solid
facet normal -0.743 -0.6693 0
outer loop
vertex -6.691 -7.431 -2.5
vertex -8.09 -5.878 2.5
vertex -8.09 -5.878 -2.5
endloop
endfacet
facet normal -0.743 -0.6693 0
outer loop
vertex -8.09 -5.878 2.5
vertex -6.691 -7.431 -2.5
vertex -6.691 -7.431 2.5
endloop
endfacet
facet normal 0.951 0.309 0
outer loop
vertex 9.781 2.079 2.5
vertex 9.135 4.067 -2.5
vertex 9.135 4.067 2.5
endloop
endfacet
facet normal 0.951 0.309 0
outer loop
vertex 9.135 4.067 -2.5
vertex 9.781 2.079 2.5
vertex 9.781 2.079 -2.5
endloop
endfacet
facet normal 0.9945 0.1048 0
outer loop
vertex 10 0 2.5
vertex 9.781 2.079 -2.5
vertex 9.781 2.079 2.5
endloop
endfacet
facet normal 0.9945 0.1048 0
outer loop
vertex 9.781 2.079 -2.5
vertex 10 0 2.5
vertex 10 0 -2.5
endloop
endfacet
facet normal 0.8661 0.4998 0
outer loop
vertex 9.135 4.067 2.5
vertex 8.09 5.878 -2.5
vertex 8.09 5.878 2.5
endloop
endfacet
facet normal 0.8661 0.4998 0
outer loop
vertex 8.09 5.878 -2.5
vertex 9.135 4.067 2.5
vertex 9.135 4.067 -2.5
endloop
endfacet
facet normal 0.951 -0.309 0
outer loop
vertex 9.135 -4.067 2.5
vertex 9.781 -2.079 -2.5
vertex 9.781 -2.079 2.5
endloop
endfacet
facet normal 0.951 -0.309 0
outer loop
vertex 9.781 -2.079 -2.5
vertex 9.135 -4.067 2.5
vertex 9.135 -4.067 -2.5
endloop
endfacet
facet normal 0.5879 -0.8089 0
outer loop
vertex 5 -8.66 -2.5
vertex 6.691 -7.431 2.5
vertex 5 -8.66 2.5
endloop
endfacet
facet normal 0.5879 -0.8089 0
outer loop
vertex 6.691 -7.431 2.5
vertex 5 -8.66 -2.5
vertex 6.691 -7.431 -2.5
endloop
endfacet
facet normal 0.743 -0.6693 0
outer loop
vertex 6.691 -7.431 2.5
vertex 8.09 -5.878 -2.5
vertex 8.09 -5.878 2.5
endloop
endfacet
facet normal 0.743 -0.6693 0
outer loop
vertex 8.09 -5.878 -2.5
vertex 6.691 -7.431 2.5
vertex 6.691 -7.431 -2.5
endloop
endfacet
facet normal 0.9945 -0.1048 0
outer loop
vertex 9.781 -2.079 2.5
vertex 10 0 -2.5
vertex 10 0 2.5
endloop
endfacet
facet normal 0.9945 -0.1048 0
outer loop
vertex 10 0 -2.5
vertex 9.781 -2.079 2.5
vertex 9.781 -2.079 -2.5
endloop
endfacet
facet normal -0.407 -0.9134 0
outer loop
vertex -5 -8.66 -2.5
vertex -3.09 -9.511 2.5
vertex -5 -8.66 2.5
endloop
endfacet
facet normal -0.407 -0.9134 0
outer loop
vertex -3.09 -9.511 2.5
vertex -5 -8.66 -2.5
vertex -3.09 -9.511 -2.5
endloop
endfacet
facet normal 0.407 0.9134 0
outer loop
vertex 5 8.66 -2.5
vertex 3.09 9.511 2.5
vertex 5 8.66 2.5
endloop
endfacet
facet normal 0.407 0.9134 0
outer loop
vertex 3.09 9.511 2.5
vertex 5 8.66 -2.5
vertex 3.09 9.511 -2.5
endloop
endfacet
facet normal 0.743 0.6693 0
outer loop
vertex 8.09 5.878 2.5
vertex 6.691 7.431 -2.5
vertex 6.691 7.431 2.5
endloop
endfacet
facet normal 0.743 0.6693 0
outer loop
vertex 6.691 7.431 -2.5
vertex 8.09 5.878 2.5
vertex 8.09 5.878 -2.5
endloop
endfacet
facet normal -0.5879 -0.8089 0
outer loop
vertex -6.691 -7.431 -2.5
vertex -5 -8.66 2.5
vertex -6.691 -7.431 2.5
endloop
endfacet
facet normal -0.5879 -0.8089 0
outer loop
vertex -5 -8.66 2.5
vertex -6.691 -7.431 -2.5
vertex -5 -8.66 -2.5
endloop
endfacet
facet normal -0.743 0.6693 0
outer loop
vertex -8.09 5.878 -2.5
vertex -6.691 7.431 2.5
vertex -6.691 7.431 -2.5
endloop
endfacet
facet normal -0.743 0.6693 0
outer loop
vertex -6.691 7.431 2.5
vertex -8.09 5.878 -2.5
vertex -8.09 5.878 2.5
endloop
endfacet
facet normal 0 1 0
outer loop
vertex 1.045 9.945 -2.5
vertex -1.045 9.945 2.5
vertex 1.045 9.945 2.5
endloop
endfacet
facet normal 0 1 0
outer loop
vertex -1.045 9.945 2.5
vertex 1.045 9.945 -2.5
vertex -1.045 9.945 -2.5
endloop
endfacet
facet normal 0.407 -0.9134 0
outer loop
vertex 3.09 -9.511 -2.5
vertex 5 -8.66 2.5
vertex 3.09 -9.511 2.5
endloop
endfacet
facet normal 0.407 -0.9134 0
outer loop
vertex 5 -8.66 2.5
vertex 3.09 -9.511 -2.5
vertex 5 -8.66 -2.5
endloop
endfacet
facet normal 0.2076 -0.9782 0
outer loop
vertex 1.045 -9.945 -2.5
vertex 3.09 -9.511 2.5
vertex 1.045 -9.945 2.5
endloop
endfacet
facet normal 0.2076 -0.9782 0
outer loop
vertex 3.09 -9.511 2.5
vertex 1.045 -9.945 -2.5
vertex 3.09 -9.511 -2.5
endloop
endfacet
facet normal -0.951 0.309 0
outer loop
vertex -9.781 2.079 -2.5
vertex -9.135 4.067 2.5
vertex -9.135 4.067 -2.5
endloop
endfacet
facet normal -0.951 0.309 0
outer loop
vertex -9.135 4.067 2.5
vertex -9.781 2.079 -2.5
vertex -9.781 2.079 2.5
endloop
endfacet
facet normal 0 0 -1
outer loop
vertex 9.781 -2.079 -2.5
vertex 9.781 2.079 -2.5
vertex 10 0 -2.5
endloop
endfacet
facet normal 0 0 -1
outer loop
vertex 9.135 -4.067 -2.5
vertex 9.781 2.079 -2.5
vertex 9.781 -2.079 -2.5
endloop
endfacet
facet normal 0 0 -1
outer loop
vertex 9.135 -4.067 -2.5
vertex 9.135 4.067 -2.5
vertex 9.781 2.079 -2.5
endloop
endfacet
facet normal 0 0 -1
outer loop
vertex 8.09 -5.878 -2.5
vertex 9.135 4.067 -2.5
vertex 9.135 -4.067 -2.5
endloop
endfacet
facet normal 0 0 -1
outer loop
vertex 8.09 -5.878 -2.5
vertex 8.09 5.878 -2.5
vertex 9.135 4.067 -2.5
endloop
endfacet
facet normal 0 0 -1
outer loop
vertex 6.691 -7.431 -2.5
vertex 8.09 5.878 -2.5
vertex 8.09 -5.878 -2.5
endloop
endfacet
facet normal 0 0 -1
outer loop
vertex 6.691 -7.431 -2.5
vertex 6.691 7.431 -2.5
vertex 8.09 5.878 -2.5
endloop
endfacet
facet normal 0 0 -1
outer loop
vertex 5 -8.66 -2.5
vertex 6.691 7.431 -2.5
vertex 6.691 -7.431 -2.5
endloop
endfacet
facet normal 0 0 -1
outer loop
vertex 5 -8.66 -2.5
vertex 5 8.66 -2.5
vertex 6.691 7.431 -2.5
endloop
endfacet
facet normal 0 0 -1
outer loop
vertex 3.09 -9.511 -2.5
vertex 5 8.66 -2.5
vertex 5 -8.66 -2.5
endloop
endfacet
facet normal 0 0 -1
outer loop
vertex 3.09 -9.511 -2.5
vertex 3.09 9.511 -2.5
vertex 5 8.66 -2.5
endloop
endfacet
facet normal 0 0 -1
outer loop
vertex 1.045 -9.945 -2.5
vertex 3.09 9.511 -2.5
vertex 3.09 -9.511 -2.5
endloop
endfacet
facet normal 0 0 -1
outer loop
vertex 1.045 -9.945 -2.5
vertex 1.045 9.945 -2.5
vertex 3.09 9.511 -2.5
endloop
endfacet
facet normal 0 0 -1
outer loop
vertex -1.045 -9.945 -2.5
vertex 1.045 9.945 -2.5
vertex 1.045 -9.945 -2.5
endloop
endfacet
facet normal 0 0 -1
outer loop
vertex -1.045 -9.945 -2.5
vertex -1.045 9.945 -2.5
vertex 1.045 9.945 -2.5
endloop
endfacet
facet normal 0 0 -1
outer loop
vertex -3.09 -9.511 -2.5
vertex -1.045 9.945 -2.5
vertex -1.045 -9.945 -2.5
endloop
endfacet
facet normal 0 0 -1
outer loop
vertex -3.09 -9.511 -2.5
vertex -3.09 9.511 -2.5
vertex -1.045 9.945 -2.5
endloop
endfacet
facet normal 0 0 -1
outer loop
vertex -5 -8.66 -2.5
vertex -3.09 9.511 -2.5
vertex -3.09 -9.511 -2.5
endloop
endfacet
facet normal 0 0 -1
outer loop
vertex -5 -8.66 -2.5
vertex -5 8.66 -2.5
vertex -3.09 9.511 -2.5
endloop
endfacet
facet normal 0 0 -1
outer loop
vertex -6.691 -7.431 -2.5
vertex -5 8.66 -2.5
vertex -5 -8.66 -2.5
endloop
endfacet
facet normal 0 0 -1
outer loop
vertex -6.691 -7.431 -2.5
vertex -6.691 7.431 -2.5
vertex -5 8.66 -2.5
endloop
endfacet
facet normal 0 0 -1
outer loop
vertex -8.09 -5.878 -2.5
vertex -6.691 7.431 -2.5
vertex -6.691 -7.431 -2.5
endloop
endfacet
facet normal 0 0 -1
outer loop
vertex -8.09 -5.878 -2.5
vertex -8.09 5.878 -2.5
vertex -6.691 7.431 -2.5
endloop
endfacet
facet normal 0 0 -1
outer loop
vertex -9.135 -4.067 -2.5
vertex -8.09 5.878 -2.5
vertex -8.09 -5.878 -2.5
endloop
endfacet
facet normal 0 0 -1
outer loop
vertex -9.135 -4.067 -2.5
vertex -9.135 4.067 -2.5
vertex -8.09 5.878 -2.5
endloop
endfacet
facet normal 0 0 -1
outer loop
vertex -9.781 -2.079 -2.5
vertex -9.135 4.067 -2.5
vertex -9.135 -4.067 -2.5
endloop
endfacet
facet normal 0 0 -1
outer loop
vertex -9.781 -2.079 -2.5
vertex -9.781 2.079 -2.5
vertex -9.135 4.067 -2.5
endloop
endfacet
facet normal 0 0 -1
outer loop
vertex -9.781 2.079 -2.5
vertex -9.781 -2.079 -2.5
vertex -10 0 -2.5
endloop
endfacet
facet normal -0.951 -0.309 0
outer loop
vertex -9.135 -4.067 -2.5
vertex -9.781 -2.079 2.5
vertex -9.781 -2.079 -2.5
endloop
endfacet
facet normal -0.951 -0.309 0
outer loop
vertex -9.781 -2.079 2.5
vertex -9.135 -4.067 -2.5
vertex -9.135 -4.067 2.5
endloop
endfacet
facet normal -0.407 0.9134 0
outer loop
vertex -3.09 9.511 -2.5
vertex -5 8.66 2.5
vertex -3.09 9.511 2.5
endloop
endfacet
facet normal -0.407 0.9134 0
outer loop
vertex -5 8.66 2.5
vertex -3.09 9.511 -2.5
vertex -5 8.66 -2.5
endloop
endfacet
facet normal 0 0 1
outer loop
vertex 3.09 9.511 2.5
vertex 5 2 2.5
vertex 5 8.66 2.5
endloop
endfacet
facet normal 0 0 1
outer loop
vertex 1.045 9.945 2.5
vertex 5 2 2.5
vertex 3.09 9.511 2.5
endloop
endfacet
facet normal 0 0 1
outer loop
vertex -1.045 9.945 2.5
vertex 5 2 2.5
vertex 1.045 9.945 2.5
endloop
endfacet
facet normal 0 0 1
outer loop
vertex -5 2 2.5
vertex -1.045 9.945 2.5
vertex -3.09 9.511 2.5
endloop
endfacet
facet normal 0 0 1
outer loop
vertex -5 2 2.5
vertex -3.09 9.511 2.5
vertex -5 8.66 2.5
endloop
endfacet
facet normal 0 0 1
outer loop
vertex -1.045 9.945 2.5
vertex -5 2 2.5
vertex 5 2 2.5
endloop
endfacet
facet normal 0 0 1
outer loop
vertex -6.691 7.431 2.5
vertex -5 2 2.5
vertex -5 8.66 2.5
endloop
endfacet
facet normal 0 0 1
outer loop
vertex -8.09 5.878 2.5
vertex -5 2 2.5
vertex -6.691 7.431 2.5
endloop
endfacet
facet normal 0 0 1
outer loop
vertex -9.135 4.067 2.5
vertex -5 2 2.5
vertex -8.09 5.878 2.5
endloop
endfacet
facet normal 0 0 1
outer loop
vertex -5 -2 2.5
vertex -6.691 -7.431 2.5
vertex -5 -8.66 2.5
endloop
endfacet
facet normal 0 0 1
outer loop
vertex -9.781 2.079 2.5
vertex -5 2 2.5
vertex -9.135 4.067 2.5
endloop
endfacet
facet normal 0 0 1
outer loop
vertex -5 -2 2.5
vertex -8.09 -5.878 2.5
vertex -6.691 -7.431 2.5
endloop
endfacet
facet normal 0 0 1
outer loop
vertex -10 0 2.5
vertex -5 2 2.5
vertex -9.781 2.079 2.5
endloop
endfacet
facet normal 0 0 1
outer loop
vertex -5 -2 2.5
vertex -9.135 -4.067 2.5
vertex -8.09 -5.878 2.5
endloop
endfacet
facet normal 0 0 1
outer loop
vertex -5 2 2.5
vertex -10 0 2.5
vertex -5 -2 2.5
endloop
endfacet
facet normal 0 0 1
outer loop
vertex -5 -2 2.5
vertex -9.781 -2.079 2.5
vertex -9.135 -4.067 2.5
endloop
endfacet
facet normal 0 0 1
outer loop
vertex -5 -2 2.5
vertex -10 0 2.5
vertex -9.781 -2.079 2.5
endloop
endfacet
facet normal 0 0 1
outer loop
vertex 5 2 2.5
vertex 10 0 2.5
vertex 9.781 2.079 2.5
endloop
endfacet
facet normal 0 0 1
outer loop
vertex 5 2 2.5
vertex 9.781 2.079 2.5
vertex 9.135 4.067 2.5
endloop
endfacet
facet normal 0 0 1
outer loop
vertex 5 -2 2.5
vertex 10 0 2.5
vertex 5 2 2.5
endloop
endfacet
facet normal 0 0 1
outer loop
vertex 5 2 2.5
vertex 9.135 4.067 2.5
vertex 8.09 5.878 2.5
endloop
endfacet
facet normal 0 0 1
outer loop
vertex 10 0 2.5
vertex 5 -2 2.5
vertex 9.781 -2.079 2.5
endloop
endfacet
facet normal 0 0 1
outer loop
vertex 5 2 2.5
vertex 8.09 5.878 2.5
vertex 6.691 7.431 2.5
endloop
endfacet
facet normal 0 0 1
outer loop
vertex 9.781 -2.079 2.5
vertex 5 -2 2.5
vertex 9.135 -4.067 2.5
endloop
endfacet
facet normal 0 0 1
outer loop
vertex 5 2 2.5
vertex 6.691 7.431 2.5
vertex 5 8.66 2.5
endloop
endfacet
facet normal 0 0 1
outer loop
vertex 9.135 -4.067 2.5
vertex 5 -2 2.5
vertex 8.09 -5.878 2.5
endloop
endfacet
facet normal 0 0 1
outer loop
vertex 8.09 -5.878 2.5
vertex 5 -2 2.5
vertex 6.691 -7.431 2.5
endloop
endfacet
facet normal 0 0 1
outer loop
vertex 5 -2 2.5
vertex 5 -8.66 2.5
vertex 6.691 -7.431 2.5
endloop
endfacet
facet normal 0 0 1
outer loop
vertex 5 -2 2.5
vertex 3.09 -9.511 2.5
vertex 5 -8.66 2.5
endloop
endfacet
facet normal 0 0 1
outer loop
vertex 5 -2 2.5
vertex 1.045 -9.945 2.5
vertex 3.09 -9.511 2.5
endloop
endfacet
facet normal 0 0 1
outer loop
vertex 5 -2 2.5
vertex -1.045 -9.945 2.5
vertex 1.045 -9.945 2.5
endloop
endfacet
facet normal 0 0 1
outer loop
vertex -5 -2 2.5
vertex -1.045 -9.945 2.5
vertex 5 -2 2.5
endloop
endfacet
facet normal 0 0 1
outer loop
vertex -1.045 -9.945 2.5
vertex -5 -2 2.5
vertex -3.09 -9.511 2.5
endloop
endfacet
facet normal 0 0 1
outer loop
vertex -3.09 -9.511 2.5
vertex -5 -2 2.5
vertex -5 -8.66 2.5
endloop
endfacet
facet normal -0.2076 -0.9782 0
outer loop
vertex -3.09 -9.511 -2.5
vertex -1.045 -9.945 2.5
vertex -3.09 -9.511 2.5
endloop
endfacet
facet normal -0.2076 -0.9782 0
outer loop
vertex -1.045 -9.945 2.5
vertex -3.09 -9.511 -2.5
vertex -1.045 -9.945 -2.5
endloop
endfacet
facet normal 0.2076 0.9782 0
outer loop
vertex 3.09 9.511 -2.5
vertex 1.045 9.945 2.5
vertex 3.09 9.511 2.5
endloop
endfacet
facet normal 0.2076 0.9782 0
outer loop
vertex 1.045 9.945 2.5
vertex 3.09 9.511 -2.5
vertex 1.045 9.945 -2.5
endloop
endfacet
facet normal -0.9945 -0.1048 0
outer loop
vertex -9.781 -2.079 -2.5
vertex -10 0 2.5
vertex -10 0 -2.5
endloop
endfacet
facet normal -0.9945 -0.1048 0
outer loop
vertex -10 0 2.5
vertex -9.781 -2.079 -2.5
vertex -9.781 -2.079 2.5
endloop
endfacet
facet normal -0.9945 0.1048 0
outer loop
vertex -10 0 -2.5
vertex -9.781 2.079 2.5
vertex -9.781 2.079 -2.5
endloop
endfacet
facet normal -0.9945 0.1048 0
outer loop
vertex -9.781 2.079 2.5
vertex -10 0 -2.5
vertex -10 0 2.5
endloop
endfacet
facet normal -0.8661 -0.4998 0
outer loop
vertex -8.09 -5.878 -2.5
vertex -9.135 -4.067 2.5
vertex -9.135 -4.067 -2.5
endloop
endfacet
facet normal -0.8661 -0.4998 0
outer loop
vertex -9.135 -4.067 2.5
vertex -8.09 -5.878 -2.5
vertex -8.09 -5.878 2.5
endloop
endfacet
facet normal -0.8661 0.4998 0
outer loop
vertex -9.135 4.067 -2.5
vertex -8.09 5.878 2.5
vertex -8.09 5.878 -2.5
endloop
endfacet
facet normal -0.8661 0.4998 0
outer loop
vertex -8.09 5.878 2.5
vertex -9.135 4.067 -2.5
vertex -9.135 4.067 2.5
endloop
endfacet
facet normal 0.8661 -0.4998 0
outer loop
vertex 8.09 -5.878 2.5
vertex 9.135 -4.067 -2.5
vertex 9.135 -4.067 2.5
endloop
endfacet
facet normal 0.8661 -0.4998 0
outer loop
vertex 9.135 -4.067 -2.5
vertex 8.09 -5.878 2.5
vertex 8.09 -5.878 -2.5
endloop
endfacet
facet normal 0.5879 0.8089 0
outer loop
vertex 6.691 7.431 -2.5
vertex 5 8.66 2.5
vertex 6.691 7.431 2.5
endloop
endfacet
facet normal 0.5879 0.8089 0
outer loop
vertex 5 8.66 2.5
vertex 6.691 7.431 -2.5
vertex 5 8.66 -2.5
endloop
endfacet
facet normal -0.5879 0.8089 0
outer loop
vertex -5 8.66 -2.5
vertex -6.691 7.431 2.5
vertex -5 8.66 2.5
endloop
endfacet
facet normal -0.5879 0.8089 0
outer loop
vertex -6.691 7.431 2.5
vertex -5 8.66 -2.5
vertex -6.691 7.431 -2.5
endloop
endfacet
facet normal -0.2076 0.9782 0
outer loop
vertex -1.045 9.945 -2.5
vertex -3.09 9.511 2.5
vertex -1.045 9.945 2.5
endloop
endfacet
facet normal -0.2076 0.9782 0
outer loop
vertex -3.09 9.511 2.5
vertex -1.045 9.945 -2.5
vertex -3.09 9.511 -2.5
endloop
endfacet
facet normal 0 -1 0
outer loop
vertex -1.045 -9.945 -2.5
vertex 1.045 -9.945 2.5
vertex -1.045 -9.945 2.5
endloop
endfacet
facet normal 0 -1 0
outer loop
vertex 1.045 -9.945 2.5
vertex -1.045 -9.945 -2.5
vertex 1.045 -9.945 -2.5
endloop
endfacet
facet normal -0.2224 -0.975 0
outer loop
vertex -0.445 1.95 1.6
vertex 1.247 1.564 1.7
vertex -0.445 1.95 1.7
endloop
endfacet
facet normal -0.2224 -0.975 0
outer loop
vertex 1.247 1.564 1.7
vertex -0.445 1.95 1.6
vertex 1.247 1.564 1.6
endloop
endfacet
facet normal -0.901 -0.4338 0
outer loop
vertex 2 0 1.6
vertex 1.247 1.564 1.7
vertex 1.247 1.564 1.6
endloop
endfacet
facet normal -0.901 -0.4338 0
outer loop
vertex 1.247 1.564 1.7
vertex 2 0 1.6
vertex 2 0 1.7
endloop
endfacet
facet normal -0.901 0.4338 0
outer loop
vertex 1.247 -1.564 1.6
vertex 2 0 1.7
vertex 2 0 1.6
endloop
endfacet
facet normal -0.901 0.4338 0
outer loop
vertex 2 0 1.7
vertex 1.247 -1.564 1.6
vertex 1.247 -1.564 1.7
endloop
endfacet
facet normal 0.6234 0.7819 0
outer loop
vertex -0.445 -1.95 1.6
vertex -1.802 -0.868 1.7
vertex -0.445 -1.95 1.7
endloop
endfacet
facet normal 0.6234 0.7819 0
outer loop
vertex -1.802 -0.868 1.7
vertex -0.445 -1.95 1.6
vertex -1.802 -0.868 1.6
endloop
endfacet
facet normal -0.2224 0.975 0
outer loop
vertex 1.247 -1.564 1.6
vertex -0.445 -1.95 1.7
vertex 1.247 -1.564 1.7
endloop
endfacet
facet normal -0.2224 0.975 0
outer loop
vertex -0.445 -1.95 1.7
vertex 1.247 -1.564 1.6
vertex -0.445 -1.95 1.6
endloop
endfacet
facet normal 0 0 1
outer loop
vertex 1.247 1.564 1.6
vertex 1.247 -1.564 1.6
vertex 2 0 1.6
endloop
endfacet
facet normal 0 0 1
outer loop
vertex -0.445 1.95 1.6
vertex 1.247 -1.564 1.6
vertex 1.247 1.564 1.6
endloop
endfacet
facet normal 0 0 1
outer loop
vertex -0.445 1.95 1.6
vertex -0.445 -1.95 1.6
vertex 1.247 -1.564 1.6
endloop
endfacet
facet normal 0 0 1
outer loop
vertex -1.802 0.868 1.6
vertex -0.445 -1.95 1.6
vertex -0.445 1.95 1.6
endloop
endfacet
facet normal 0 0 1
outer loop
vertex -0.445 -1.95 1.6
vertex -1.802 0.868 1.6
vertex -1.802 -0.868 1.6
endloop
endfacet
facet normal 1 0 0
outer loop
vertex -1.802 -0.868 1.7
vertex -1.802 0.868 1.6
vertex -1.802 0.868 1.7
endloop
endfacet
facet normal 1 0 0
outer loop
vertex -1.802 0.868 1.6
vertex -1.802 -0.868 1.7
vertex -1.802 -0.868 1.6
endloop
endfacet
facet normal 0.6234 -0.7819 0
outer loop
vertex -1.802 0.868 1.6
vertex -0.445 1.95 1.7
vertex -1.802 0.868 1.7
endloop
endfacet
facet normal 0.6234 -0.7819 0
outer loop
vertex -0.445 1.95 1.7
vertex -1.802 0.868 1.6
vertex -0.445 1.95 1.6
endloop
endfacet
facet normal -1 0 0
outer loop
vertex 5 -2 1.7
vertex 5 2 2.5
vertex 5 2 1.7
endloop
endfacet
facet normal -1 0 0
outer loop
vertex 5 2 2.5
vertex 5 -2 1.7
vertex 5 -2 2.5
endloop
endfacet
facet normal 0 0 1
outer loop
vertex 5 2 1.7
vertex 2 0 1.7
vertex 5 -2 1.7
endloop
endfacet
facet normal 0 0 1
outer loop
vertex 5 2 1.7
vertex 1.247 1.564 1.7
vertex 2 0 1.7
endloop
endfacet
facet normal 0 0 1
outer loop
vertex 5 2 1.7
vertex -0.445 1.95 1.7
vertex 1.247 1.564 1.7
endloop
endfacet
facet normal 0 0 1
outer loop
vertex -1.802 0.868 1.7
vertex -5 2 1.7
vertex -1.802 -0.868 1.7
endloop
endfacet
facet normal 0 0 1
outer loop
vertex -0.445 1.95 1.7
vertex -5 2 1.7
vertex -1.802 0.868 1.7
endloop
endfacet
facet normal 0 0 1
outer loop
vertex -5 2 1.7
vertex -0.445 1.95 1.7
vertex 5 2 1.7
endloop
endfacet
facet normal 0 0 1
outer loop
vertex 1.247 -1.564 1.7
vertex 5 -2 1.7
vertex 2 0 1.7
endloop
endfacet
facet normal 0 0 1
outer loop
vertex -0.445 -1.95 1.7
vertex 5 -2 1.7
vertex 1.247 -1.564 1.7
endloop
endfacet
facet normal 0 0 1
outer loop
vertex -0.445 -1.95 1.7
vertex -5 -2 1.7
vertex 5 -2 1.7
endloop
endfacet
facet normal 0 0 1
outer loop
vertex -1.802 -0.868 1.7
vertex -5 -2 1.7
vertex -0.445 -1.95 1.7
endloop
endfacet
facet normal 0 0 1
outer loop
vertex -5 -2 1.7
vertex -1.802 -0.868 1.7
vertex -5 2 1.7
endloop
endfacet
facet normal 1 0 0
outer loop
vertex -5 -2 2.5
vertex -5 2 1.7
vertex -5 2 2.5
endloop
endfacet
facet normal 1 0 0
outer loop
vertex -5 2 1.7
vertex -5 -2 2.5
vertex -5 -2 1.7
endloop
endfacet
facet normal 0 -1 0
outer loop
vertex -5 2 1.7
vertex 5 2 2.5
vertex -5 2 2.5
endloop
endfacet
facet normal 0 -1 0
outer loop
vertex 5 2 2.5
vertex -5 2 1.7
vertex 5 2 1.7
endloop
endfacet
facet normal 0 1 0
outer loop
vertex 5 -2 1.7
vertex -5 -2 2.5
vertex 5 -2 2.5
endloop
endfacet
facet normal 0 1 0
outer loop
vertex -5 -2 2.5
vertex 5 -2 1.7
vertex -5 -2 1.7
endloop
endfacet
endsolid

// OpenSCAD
// Parameters
magnet_diameter = 20; //[10:40:1]
magnet_thickness = 5; //[2.5:10:0.5]
chamfer_size = 0.5; //[0.25:1:0.05]
overlap = 1; //[0.5:2:0.1]
polarity_mark_diameter = 4; //[2:8:0.5]
polarity_mark_depth = 0.4; //[0.2:1:0.05]
label_depth = 0.3; //[0.1:0.8:0.05]
label_width = 10; //[5:20:0.5]
label_height = 4; //[2:10:0.5]

// Base Shapes
module magnet_body() {
  cylinder(h=magnet_thickness, r=magnet_diameter/2, center=true);
}

module edge_chamfer() {
  translate([0, 0, magnet_thickness/2 - chamfer_size/2 + overlap/2])
    cylinder(h=chamfer_size, r1=magnet_diameter/2, r2=0, center=true);
}

module polarity_marking() {
  translate([0, 0, magnet_thickness/2 - polarity_mark_depth/2])
    cylinder(h=polarity_mark_depth + overlap, r=polarity_mark_diameter/2, center=true);
}

module engraved_label() {
  translate([0, 0, magnet_thickness/2 - label_depth/2])
    cube([label_width, label_height, label_depth + overlap], center=true);
}

// Operations
module magnet_with_chamfer() {
  difference() {
    magnet_body();
    edge_chamfer();
  }
}

module magnet_with_mark() {
  difference() {
    magnet_with_chamfer();
    polarity_marking();
  }
}

module magnet_complete() {
  difference() {
    magnet_with_mark();
    engraved_label();
  }
}

// Final Output
color([0.8, 0.6, 0.2]) // Brass color for the magnet
magnet_complete();
